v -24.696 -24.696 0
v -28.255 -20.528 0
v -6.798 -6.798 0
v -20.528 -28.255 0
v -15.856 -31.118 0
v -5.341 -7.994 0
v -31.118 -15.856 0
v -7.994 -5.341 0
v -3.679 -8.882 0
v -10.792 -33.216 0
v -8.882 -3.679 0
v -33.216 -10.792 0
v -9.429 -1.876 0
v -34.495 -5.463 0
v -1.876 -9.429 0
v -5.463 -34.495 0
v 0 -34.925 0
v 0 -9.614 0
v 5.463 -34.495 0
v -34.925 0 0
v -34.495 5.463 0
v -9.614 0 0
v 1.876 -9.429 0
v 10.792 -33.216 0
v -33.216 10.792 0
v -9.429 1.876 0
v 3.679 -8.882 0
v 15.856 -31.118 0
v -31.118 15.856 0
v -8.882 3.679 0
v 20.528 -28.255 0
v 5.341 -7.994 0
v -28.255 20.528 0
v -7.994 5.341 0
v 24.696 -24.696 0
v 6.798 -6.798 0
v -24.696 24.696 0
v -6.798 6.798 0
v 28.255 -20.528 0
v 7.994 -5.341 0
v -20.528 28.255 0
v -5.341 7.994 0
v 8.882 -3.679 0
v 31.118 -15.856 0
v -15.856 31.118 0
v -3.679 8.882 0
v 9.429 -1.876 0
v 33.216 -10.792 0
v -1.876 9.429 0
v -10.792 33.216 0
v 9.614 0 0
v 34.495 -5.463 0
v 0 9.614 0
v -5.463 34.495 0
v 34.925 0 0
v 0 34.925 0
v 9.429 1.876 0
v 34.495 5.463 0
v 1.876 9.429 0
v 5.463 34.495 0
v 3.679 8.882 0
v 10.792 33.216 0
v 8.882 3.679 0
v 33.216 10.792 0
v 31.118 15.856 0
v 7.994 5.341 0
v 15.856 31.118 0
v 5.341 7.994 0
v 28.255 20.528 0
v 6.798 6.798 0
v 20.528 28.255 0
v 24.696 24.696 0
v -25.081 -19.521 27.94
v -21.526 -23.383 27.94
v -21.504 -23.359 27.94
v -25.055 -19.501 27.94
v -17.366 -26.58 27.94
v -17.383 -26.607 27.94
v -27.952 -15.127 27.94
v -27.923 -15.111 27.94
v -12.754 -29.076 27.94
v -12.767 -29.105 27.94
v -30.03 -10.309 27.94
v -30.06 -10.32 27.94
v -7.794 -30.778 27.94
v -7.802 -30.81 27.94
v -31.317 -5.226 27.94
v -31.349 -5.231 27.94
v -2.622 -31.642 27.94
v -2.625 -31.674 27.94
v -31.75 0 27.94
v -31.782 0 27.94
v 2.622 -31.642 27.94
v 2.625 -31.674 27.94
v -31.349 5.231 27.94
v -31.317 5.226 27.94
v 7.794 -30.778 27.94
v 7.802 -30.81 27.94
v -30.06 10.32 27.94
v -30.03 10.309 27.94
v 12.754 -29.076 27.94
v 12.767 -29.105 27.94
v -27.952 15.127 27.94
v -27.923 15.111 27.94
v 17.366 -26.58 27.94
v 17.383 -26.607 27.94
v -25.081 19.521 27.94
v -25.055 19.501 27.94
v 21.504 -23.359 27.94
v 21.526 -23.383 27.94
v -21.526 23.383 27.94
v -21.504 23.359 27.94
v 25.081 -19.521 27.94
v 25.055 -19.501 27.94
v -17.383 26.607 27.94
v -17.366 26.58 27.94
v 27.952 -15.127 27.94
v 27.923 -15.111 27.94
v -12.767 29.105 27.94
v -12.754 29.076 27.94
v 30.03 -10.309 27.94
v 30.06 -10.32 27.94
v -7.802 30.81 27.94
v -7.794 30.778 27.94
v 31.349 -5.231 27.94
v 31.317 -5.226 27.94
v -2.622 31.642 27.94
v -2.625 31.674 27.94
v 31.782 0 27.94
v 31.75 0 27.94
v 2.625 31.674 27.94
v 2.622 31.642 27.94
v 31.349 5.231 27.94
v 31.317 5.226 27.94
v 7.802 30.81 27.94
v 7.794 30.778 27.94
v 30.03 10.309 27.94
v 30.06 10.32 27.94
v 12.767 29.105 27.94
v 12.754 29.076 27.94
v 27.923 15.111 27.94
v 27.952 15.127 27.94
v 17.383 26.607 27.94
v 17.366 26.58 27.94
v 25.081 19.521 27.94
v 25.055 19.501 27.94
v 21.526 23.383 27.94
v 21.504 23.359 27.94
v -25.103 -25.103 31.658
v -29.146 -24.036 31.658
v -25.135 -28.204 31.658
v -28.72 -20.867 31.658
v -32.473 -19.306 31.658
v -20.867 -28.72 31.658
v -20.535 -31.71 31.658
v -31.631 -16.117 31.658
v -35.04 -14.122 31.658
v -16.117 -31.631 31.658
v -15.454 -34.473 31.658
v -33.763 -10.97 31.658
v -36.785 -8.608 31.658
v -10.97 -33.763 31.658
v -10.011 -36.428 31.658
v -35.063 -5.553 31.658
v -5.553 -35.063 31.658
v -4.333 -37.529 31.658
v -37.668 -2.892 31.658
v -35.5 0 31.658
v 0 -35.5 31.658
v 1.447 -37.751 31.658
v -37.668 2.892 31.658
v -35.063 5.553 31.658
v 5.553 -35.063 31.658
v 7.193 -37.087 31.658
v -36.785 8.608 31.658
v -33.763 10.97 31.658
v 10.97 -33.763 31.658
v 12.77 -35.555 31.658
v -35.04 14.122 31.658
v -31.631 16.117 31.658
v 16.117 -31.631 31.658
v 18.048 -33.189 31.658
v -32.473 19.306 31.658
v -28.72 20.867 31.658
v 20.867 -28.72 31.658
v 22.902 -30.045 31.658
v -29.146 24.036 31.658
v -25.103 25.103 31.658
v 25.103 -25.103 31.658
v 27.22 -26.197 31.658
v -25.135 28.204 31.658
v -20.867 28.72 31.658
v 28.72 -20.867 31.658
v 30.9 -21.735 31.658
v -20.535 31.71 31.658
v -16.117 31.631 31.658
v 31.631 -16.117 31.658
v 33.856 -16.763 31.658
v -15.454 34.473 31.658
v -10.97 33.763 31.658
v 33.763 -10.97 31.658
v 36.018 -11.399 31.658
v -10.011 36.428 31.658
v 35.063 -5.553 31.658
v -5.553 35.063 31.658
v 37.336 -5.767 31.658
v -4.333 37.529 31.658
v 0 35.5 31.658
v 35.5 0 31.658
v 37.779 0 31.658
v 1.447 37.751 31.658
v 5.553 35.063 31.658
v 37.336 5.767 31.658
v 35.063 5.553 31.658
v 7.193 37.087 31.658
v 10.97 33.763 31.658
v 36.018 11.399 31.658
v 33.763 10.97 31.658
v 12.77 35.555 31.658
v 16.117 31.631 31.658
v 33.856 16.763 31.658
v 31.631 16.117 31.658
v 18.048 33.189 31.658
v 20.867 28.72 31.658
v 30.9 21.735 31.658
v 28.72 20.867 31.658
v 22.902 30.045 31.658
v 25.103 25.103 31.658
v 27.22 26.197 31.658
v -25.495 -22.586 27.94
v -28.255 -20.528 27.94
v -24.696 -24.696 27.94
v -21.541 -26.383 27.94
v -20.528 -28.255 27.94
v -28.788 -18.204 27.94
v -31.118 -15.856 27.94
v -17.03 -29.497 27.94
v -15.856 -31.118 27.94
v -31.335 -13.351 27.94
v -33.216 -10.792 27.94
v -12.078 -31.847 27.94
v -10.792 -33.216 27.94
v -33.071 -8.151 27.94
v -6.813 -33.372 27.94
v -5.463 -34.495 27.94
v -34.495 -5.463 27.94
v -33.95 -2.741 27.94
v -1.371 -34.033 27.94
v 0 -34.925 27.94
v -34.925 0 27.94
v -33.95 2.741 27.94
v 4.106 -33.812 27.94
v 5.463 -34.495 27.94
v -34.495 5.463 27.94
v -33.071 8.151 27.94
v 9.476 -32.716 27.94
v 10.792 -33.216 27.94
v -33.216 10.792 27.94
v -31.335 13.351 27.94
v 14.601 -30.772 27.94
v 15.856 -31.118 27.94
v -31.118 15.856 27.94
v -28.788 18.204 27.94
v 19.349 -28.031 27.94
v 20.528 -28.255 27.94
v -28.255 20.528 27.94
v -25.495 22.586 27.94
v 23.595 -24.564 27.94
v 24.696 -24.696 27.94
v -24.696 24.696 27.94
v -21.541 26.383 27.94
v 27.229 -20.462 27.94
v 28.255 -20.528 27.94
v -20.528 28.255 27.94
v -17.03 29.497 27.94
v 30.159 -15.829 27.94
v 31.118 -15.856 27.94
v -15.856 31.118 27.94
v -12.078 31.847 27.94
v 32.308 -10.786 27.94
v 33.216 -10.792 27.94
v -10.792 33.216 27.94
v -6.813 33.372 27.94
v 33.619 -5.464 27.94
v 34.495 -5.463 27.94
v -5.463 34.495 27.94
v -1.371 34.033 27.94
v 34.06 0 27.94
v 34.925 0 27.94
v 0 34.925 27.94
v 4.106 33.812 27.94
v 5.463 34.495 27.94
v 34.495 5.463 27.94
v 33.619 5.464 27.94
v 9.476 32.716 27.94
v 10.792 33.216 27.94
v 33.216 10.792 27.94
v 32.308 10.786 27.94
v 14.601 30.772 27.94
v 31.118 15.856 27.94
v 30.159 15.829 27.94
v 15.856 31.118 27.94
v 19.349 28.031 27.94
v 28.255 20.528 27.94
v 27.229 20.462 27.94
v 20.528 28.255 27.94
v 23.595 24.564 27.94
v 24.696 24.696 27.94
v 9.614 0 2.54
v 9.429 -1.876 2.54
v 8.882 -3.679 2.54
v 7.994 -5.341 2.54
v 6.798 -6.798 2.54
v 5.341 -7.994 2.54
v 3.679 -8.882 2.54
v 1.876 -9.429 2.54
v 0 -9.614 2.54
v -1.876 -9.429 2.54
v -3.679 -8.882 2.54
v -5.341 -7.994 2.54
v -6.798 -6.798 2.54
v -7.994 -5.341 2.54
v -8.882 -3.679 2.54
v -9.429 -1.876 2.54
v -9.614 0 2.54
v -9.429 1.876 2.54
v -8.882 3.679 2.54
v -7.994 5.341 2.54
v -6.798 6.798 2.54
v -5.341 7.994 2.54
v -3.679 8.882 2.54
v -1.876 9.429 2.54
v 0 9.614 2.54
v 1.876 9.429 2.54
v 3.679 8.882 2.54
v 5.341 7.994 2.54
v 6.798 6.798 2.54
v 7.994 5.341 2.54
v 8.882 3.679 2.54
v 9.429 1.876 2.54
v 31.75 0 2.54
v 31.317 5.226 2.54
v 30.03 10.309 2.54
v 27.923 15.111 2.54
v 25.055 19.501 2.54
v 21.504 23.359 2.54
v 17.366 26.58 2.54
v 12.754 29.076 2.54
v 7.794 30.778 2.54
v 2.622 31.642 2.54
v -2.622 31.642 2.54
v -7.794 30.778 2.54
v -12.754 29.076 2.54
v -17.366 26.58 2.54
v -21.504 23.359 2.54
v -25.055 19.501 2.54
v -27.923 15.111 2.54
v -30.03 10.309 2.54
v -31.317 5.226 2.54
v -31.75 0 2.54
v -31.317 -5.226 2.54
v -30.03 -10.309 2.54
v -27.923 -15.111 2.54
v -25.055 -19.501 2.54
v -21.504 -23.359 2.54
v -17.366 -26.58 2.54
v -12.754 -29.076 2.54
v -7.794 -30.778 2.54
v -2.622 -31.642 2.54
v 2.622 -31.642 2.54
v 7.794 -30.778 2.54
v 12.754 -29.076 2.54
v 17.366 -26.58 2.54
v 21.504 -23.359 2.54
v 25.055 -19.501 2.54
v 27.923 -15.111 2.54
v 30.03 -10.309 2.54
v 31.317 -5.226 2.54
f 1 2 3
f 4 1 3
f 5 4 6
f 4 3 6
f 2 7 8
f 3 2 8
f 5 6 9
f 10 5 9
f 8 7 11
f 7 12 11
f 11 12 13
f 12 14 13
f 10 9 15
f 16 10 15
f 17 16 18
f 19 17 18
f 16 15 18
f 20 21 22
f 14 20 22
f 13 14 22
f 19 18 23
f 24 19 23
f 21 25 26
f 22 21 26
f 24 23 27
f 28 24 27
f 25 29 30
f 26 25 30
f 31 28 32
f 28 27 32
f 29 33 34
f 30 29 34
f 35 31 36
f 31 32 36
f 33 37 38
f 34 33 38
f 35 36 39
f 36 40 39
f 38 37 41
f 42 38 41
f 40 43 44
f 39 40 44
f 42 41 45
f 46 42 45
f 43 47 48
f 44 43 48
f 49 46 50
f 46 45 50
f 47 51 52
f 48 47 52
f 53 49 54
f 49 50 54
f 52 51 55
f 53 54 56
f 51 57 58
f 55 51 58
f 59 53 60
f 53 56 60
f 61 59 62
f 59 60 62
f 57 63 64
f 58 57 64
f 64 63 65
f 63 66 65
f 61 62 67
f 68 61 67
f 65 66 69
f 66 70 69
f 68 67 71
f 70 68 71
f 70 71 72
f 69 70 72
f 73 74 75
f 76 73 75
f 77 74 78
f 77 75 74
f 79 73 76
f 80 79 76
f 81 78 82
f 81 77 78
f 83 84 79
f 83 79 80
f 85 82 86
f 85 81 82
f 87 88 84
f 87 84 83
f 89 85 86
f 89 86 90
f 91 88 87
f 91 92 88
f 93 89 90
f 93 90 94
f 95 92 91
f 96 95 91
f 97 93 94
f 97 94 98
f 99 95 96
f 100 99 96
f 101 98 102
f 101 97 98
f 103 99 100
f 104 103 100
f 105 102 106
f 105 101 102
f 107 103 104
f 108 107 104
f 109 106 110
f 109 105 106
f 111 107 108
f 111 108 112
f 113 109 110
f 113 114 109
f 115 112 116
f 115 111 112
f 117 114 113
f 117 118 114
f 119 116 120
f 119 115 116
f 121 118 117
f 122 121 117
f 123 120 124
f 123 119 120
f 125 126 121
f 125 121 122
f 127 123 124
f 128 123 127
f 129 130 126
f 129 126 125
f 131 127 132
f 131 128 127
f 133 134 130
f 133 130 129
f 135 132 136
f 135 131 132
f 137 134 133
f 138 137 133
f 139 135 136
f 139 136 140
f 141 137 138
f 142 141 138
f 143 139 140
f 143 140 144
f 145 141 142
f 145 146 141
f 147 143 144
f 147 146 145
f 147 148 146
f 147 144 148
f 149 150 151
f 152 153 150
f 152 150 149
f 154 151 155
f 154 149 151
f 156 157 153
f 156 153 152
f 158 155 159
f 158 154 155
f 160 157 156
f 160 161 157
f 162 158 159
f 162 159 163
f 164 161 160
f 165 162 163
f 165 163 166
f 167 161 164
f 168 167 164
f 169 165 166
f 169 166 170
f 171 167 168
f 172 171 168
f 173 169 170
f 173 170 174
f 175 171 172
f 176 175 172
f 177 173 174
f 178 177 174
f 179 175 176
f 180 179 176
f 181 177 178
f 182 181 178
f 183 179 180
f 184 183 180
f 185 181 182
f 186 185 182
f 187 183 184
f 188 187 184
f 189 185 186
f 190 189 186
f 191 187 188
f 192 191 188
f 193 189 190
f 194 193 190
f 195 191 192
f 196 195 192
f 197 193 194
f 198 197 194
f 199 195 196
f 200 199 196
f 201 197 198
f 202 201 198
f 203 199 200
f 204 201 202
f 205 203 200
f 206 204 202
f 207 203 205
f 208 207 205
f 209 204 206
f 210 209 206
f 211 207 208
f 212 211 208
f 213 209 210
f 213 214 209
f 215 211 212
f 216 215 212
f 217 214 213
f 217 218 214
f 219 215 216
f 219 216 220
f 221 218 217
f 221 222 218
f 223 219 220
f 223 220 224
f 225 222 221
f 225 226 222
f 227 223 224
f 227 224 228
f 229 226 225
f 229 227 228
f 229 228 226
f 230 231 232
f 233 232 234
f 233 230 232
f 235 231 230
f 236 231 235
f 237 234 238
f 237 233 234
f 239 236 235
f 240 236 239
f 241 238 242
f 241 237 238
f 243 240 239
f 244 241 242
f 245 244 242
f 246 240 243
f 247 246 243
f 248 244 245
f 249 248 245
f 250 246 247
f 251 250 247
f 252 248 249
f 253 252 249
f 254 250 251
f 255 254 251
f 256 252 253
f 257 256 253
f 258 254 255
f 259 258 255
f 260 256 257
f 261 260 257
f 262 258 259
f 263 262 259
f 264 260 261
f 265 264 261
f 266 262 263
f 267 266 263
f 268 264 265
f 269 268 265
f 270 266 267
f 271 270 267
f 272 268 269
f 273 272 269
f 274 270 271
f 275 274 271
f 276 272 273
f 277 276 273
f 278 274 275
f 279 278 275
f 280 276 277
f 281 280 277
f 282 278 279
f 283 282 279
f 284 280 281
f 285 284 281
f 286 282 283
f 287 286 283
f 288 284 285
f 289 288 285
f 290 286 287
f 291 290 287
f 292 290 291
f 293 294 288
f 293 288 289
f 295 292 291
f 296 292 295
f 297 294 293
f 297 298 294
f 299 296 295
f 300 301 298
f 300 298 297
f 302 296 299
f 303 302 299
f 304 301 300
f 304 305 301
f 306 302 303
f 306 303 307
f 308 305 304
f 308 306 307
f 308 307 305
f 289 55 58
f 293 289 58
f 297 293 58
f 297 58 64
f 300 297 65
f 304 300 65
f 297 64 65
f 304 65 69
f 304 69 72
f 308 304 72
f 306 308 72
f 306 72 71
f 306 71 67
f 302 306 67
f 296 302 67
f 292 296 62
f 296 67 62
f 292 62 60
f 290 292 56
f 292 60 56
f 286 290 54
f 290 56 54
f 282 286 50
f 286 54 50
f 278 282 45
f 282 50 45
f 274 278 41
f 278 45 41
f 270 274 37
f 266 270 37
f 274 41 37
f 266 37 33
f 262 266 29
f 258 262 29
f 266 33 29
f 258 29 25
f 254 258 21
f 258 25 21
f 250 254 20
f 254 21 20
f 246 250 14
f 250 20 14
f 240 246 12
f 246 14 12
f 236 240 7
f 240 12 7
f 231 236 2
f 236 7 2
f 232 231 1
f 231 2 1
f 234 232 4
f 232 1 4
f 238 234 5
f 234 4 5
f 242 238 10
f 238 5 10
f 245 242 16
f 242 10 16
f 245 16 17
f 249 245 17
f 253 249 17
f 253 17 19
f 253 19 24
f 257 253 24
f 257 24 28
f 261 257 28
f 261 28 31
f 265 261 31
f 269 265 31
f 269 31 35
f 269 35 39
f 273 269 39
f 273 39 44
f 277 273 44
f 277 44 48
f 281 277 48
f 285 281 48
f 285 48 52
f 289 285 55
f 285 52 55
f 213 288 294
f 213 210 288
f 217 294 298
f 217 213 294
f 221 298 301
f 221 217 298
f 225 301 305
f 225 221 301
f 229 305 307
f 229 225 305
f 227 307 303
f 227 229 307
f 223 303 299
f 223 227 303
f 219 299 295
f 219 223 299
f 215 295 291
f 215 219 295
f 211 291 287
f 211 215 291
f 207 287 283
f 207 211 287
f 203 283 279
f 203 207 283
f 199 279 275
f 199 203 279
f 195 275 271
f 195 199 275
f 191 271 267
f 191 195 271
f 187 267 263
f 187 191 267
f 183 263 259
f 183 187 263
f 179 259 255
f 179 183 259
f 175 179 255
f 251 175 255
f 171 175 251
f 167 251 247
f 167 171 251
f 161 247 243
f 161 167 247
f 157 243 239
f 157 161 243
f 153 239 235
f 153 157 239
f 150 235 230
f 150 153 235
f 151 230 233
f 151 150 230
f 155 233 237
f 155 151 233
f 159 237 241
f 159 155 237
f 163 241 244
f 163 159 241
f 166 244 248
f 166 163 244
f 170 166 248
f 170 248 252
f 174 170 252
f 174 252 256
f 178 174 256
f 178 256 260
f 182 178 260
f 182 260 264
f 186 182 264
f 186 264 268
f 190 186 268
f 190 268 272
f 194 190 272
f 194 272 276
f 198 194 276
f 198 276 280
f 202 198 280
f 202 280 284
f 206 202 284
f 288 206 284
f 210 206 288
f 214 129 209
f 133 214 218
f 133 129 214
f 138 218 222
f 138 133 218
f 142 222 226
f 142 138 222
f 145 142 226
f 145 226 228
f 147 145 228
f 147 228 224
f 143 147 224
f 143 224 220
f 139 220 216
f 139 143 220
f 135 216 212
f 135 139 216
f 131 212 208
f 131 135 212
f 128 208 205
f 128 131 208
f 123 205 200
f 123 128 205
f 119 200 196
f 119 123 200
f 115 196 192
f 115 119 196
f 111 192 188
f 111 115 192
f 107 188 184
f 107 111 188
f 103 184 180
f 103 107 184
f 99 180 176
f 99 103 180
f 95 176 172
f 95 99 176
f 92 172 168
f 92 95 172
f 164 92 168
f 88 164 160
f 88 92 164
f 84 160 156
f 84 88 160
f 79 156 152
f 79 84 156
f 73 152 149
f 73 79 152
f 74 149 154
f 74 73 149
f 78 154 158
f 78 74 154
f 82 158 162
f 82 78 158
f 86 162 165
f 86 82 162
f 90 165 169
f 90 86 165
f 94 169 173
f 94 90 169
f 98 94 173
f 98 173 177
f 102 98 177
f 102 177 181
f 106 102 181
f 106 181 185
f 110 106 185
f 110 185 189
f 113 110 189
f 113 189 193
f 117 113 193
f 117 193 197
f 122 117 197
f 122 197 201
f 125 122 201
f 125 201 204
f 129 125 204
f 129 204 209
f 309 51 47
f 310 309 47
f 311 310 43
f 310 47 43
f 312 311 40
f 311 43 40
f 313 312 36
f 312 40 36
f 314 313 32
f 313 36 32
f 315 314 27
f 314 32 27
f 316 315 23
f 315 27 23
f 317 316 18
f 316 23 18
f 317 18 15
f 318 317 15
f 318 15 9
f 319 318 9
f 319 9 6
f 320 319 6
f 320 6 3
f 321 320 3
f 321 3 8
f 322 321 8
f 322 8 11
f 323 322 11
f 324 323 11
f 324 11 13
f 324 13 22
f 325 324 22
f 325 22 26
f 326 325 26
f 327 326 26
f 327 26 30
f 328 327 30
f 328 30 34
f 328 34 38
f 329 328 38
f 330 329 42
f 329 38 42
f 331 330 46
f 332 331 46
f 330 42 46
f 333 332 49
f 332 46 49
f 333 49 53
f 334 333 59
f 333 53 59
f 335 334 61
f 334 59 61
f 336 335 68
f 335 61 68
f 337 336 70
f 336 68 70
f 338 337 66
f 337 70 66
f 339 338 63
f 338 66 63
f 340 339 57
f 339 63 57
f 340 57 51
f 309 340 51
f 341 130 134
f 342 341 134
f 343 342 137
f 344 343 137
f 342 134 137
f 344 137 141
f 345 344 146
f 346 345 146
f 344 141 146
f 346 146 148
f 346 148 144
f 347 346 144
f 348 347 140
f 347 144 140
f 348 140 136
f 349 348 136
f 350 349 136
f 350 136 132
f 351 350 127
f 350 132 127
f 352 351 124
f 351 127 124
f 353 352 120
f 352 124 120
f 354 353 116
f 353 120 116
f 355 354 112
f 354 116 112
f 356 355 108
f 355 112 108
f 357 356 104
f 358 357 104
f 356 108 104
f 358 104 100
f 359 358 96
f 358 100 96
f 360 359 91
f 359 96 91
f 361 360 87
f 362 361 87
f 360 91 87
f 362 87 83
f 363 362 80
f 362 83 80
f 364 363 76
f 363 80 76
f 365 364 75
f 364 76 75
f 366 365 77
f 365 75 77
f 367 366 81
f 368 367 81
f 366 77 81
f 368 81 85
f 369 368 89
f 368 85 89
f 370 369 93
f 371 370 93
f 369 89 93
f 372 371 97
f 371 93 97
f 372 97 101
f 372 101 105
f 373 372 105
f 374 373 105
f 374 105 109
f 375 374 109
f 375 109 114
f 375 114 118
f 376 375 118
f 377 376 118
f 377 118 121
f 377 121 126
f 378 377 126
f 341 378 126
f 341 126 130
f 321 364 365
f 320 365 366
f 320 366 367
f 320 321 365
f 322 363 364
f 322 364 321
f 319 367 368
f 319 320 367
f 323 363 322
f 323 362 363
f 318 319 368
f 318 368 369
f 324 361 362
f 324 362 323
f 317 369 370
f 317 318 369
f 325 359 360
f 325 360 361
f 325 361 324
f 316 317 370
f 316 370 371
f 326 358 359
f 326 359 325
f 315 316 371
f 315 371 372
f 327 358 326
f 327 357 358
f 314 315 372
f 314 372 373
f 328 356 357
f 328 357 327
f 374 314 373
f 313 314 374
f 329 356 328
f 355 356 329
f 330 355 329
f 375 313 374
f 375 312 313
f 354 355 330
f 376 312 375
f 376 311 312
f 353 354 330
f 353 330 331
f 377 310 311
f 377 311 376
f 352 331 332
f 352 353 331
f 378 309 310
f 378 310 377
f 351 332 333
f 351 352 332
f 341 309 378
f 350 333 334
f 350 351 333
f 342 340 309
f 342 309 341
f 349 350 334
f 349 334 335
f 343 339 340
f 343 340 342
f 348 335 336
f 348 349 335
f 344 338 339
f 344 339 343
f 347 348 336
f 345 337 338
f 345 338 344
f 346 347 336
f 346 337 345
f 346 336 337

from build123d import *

# Parameters (mm, degrees)
SKETCH125_R     = 34.925
PAD046_DEPTH    = 27.94
SKETCH126_R     = 31.75
POCKET046_DEPTH = 25.4
SKETCH127_R     = 9.6139
POCKET047_DEPTH = 27.941


with BuildPart() as part:
    # Sketch125 → Pad046 (new body)
    with BuildSketch(Plane.XY):
        Circle(SKETCH125_R)
    extrude(amount=PAD046_DEPTH)

    # Sketch126 (on Face3 of Pad046) → Pocket046 (cut)
    with BuildSketch(Plane.XY.offset(27.94)):
        Circle(SKETCH126_R)
    extrude(amount=-POCKET046_DEPTH, mode=Mode.SUBTRACT)

    # Sketch127 (on Face2 of Pocket046) → Pocket047 (cut, through all)
    with BuildSketch(Plane(origin=(0, 0, 0), x_dir=(1, 0, 0), z_dir=(0, 0, -1))):
        Circle(SKETCH127_R)
    extrude(amount=-POCKET047_DEPTH, mode=Mode.SUBTRACT)

    # Sketch131 → Revolution001 (revolve)
    with BuildSketch(Plane.XZ):
        Polygon((34.041662, 27.921203), (37.778515, 31.658056), (35.500414, 31.658056), (31.763561, 27.921203), align=None)
    revolve(axis=Axis((0, 0, 0), (0, 0, 1)))


solid = part.part
